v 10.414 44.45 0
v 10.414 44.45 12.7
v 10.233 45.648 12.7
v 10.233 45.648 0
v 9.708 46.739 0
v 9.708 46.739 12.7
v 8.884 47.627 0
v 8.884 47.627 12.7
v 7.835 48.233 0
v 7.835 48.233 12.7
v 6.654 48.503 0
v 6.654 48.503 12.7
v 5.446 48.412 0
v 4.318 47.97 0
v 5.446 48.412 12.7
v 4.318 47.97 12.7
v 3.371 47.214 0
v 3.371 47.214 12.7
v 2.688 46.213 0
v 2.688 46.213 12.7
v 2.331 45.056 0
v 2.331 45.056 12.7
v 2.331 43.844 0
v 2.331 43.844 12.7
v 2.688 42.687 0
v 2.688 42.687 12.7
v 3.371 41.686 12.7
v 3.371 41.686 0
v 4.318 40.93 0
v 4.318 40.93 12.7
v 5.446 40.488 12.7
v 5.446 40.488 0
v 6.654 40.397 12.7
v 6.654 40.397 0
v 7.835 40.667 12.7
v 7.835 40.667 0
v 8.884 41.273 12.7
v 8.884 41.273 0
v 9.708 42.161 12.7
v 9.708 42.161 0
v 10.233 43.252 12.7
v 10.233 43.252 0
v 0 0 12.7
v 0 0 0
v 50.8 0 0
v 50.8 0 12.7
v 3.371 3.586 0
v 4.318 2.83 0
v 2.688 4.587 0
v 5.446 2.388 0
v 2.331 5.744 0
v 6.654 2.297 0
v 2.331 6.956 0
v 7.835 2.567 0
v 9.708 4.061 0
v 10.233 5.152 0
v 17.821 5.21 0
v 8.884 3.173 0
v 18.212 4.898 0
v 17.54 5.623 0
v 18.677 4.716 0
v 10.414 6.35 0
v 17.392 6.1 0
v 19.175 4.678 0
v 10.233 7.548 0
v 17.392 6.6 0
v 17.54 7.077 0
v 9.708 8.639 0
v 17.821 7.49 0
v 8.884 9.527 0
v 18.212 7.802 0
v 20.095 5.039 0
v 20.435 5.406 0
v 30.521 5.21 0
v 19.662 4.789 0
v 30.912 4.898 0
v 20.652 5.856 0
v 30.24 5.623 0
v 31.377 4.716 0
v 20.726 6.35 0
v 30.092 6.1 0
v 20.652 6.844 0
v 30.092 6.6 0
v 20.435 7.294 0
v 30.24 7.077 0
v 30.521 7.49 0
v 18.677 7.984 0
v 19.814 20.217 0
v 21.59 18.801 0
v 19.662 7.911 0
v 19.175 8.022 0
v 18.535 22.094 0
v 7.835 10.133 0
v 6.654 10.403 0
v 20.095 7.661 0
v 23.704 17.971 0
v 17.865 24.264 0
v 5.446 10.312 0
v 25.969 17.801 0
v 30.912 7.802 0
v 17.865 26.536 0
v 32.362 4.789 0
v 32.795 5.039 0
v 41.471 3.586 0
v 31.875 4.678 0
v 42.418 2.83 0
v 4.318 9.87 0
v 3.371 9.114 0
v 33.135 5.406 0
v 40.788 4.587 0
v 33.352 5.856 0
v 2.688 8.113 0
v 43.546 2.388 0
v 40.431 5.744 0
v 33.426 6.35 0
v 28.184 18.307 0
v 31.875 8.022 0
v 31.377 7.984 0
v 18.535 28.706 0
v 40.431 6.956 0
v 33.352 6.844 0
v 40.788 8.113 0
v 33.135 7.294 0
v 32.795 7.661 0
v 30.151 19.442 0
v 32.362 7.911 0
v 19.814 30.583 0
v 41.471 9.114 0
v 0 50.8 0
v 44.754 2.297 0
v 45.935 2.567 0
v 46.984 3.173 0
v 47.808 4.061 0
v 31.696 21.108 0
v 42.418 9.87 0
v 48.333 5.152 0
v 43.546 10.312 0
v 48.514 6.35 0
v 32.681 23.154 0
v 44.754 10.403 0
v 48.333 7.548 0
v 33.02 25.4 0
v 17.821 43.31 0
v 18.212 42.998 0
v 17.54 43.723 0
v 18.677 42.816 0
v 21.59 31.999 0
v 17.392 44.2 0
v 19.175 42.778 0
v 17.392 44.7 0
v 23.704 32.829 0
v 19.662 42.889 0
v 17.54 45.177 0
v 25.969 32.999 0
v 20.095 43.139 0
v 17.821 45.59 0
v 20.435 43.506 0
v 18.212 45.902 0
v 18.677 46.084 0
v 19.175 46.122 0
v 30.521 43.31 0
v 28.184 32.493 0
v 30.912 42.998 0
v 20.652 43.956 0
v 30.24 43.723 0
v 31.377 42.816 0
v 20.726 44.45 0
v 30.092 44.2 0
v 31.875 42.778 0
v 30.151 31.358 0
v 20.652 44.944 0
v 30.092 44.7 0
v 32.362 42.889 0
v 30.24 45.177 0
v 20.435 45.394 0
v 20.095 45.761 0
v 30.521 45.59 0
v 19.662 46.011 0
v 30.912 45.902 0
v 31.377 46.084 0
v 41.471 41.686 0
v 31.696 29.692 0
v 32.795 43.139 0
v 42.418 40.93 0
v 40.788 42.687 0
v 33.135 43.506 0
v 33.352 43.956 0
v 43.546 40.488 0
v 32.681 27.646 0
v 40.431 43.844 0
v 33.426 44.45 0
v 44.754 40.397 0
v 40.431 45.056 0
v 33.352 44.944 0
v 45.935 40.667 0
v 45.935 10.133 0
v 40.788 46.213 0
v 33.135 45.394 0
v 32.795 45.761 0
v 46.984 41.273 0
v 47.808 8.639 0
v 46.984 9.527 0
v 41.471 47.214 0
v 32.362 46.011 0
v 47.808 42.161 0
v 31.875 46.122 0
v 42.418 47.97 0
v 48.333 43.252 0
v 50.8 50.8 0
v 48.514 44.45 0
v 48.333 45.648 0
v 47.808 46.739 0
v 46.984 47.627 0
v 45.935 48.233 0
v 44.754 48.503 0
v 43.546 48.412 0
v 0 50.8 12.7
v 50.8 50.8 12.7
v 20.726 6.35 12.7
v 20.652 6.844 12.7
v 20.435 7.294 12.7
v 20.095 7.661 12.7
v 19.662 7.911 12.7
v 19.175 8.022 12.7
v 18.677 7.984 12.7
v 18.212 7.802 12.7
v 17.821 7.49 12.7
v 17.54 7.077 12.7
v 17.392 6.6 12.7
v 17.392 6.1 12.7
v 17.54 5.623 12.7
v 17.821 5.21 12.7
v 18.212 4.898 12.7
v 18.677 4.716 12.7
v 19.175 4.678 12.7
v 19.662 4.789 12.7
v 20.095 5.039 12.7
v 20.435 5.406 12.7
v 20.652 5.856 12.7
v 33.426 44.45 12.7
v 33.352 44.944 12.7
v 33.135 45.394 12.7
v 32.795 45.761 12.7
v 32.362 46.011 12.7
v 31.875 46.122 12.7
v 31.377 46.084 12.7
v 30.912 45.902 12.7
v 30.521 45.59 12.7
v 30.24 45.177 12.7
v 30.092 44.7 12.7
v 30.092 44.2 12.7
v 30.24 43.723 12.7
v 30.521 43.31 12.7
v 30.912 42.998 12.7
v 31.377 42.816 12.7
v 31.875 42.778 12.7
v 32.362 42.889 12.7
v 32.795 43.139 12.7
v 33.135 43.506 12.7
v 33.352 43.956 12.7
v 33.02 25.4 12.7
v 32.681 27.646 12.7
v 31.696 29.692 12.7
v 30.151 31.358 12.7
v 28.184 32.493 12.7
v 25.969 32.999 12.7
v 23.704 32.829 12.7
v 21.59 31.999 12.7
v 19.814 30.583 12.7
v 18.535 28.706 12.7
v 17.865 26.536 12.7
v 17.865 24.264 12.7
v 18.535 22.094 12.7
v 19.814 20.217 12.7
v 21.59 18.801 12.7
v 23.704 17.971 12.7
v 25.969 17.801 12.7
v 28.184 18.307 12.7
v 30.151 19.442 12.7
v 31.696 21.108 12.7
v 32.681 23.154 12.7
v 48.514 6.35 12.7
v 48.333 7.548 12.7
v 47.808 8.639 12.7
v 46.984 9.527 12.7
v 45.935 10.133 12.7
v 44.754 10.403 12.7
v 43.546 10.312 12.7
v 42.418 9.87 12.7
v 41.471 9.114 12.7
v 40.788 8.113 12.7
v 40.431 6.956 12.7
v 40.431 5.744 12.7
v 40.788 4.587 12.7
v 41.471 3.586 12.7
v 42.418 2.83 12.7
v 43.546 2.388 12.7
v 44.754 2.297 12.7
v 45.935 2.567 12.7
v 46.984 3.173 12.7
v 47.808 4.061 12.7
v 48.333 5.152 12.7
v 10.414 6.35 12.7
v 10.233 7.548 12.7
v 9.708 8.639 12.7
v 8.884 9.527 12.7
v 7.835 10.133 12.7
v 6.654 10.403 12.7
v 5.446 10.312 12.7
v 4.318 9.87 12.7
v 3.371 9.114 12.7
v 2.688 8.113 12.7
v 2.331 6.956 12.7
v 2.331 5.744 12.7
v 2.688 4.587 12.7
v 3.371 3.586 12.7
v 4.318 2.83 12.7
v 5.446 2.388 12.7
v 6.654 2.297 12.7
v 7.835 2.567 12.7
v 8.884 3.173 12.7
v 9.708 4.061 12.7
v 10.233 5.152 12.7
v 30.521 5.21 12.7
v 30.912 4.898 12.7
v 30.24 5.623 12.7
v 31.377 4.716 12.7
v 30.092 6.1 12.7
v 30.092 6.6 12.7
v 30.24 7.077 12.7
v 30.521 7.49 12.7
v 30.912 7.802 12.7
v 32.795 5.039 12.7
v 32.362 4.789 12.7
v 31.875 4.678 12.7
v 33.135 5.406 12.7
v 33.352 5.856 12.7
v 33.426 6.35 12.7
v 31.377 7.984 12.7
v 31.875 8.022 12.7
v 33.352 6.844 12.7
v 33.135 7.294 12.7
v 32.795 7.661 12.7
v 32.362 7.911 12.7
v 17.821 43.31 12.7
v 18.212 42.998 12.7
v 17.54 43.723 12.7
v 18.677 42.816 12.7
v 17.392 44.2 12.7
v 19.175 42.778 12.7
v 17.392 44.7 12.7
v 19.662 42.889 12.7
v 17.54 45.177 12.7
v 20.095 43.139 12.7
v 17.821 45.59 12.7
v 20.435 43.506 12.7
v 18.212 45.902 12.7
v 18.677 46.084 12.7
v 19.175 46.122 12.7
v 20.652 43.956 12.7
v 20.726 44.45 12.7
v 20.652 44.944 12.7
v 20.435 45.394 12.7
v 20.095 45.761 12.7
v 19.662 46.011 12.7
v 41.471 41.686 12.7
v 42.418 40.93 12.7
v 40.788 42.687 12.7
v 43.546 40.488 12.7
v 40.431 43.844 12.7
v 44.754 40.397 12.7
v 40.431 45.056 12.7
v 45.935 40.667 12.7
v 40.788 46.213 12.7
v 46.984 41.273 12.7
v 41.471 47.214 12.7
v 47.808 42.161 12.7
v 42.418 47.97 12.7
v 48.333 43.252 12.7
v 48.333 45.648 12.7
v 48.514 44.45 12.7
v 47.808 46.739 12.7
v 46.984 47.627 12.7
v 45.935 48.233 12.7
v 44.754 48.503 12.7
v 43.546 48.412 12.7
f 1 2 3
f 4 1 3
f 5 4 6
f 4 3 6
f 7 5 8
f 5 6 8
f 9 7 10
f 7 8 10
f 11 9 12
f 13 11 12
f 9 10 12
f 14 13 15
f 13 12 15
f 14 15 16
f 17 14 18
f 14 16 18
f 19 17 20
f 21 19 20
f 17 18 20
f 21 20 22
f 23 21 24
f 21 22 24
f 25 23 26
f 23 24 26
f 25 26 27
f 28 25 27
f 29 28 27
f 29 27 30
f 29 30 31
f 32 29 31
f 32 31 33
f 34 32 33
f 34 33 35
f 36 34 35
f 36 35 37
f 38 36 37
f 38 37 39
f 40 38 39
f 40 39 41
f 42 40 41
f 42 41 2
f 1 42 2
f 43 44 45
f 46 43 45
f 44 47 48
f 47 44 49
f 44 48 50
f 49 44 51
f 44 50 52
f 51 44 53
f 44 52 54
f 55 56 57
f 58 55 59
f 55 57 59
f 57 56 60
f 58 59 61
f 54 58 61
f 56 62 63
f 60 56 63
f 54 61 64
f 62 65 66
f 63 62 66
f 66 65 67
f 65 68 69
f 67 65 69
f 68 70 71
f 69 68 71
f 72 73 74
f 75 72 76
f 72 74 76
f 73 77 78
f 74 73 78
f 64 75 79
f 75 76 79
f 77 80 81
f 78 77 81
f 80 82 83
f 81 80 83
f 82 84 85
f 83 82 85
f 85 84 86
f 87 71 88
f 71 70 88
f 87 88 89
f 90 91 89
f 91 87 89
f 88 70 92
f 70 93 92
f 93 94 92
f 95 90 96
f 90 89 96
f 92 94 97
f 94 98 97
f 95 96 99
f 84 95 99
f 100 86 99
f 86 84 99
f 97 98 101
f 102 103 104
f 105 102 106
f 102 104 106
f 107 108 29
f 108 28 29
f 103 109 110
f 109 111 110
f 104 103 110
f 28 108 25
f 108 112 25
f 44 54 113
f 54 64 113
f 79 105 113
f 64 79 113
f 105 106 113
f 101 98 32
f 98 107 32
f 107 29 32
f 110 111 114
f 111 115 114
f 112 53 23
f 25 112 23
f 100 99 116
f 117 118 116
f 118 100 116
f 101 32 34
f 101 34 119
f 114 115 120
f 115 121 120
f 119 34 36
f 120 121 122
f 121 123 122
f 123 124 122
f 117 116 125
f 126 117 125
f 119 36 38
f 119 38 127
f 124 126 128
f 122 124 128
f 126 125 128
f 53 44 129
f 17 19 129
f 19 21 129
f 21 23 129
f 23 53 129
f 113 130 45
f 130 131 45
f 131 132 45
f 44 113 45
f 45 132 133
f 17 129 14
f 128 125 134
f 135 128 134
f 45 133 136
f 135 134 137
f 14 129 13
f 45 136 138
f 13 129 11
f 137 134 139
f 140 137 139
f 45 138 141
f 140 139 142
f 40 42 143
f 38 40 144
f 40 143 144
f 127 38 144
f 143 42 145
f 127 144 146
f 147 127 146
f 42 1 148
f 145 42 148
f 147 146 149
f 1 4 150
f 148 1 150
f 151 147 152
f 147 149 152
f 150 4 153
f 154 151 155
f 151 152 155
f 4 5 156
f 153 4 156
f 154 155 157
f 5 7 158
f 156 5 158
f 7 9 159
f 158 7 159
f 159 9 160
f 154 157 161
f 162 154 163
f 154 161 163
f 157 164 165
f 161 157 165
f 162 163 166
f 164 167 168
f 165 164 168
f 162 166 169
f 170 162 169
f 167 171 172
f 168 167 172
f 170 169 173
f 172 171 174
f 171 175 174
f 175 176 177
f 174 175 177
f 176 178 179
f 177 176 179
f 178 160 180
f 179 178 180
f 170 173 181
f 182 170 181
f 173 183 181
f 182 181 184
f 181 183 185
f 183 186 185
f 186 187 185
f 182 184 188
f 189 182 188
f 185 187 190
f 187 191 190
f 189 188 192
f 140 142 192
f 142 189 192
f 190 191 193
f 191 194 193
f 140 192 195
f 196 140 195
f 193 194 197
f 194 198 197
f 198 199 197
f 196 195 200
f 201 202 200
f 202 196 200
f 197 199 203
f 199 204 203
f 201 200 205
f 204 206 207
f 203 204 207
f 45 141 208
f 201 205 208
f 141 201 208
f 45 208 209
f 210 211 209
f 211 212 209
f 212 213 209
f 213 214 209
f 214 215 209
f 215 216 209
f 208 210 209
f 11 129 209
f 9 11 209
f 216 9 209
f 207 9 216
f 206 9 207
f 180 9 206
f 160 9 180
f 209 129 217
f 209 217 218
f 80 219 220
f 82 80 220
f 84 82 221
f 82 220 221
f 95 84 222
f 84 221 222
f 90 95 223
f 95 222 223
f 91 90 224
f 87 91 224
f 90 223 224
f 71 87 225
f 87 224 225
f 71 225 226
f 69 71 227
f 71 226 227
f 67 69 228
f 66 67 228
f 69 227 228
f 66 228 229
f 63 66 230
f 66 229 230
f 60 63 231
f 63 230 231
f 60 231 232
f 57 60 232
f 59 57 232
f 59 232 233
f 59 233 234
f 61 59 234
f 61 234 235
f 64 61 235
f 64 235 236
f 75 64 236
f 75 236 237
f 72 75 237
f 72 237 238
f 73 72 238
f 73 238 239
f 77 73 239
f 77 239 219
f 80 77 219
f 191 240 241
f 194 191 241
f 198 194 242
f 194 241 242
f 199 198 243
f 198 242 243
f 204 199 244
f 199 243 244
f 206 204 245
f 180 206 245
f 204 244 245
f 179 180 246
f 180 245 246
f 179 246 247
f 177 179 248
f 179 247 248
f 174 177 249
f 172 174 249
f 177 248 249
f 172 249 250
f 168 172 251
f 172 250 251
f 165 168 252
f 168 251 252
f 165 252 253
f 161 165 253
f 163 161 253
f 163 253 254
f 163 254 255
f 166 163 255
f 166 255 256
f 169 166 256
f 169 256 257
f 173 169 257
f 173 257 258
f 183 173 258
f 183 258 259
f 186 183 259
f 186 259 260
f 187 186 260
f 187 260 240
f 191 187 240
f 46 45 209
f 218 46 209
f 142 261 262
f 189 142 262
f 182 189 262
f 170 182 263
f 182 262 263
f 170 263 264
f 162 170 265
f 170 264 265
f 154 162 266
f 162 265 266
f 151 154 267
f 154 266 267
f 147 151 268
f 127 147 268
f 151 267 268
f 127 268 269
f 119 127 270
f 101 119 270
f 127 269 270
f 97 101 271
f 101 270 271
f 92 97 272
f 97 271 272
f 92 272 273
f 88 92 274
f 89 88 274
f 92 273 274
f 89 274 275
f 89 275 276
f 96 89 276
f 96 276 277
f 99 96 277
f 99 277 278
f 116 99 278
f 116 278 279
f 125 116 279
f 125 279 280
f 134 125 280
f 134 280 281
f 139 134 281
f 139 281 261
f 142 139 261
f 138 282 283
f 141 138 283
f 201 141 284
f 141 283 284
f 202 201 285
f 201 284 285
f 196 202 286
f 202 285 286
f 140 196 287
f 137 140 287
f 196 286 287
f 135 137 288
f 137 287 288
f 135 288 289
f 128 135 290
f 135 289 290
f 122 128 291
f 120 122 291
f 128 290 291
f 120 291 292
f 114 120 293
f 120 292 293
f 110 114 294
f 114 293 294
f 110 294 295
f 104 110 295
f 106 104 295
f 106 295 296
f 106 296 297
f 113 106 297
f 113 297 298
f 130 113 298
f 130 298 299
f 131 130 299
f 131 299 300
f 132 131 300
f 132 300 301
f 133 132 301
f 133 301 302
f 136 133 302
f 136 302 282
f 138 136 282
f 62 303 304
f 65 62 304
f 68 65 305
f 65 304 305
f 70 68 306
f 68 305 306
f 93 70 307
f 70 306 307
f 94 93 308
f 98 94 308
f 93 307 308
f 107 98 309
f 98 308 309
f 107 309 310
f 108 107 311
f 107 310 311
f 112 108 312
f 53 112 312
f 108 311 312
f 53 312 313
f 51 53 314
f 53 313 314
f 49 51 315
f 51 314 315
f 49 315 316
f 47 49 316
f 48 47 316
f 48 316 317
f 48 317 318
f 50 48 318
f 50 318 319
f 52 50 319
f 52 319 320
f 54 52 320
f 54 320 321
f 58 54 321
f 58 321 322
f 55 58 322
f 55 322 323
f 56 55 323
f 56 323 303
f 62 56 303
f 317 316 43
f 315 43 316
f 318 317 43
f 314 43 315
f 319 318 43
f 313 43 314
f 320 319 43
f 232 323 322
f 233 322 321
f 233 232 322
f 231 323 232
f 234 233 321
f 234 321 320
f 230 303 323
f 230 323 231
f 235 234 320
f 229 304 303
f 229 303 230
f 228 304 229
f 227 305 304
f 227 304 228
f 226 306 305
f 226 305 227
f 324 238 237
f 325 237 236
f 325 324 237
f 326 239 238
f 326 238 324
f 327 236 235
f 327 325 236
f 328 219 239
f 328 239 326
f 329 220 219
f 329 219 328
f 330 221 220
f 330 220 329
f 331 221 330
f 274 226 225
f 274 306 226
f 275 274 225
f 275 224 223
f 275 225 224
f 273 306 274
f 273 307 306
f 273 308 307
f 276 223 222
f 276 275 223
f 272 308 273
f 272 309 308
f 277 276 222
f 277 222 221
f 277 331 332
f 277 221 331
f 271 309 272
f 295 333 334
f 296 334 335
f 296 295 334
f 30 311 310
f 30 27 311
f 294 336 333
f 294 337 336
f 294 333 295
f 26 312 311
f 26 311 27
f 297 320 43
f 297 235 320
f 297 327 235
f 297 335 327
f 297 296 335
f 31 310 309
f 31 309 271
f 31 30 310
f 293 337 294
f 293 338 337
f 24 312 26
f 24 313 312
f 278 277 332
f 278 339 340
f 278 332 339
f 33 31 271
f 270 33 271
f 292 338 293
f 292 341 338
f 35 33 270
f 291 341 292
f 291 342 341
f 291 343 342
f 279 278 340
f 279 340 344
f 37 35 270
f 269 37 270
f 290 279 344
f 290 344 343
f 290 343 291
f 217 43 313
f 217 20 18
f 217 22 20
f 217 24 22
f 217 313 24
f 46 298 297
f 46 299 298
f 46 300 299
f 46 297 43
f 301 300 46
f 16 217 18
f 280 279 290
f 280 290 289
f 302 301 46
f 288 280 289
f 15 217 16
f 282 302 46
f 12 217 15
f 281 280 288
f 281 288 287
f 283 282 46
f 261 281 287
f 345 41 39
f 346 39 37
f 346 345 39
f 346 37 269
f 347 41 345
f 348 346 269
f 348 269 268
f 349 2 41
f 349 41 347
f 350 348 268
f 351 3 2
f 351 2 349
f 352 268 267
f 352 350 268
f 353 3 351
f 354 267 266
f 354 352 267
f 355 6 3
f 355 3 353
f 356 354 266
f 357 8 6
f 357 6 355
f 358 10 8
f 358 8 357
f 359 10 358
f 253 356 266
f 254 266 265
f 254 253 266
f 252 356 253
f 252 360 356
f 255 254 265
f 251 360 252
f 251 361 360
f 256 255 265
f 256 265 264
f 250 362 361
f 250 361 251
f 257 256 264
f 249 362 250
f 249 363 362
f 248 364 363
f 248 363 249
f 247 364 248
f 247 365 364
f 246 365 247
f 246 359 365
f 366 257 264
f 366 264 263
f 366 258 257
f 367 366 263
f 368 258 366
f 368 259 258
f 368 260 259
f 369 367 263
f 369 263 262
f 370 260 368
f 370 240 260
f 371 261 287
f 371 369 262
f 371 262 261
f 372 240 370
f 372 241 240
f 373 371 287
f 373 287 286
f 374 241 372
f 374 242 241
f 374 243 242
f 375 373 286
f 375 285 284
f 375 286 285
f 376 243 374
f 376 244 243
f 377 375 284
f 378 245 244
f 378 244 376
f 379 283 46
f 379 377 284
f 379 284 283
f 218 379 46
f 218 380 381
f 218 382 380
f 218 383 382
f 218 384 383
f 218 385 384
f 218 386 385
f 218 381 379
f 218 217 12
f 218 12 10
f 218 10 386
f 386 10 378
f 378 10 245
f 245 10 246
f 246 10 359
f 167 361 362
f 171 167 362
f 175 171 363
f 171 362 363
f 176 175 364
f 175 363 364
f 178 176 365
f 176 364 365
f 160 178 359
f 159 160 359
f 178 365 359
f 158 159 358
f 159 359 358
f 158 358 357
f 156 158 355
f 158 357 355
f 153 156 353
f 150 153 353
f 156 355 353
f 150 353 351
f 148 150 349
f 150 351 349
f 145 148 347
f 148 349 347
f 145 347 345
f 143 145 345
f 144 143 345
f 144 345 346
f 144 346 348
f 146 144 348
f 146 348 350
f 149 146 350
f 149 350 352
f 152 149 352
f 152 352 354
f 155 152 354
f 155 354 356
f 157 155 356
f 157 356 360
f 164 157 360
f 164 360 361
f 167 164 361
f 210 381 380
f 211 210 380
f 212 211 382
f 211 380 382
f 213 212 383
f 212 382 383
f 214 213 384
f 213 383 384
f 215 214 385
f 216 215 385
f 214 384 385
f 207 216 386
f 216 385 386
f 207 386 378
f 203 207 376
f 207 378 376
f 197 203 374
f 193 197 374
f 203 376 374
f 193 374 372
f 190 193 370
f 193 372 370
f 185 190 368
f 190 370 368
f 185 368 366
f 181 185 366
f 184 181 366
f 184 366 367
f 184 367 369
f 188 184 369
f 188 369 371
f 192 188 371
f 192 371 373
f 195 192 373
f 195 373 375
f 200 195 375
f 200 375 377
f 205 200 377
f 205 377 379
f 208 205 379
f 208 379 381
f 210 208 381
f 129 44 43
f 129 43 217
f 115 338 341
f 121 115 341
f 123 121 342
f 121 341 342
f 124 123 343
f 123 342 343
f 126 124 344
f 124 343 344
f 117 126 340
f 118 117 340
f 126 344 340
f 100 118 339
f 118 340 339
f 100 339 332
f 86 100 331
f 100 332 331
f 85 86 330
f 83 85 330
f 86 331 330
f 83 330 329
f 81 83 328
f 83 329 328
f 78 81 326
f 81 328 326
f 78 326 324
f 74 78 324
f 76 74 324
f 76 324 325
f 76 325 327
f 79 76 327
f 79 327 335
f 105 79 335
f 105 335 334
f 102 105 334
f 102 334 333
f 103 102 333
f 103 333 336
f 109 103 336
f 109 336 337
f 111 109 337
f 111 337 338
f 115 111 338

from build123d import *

# Parameters (mm, degrees)
SKETCH1_W           = 50.8
SKETCH1_H           = 50.8
BOSS_EXTRUDE1_DEPTH = 12.7
SKETCH2_R           = 7.62
CUT_EXTRUDE1_DEPTH  = 13.7
SKETCH3_R           = 4.064
CUT_EXTRUDE2_DEPTH  = 13.7
SKETCH4_R           = 1.6764
CUT_EXTRUDE3_DEPTH  = 13.7


with BuildPart() as part:
    # Sketch1 → Boss-Extrude1 (new body)
    with BuildSketch(Plane.XY):
        with Locations((25.4, 25.4)):
            Rectangle(SKETCH1_W, SKETCH1_H)
    extrude(amount=BOSS_EXTRUDE1_DEPTH)

    # Sketch2 → Cut-Extrude1 (cut, through all)
    with BuildSketch(Plane.XY.offset(12.7)):
        with Locations((25.4, 25.4)):
            Circle(SKETCH2_R)
    extrude(amount=-CUT_EXTRUDE1_DEPTH, mode=Mode.SUBTRACT)

    # Sketch3 → Cut-Extrude2 (cut, through all)
    with BuildSketch(Plane.XY.offset(12.7)):
        with Locations((6.35, 44.45)):
            Circle(SKETCH3_R)
        with Locations((6.35, 6.35)):
            Circle(SKETCH3_R)
        with Locations((44.45, 44.45)):
            Circle(SKETCH3_R)
        with Locations((44.45, 6.35)):
            Circle(SKETCH3_R)
    extrude(amount=-CUT_EXTRUDE2_DEPTH, mode=Mode.SUBTRACT)

    # Sketch4 → Cut-Extrude3 (cut, through all)
    with BuildSketch(Plane.XY.offset(12.7)):
        with Locations((19.05, 44.45)):
            Circle(SKETCH4_R)
        with Locations((31.75, 44.45)):
            Circle(SKETCH4_R)
        with Locations((19.05, 6.35)):
            Circle(SKETCH4_R)
        with Locations((31.75, 6.35)):
            Circle(SKETCH4_R)
    extrude(amount=-CUT_EXTRUDE3_DEPTH, mode=Mode.SUBTRACT)


solid = part.part
